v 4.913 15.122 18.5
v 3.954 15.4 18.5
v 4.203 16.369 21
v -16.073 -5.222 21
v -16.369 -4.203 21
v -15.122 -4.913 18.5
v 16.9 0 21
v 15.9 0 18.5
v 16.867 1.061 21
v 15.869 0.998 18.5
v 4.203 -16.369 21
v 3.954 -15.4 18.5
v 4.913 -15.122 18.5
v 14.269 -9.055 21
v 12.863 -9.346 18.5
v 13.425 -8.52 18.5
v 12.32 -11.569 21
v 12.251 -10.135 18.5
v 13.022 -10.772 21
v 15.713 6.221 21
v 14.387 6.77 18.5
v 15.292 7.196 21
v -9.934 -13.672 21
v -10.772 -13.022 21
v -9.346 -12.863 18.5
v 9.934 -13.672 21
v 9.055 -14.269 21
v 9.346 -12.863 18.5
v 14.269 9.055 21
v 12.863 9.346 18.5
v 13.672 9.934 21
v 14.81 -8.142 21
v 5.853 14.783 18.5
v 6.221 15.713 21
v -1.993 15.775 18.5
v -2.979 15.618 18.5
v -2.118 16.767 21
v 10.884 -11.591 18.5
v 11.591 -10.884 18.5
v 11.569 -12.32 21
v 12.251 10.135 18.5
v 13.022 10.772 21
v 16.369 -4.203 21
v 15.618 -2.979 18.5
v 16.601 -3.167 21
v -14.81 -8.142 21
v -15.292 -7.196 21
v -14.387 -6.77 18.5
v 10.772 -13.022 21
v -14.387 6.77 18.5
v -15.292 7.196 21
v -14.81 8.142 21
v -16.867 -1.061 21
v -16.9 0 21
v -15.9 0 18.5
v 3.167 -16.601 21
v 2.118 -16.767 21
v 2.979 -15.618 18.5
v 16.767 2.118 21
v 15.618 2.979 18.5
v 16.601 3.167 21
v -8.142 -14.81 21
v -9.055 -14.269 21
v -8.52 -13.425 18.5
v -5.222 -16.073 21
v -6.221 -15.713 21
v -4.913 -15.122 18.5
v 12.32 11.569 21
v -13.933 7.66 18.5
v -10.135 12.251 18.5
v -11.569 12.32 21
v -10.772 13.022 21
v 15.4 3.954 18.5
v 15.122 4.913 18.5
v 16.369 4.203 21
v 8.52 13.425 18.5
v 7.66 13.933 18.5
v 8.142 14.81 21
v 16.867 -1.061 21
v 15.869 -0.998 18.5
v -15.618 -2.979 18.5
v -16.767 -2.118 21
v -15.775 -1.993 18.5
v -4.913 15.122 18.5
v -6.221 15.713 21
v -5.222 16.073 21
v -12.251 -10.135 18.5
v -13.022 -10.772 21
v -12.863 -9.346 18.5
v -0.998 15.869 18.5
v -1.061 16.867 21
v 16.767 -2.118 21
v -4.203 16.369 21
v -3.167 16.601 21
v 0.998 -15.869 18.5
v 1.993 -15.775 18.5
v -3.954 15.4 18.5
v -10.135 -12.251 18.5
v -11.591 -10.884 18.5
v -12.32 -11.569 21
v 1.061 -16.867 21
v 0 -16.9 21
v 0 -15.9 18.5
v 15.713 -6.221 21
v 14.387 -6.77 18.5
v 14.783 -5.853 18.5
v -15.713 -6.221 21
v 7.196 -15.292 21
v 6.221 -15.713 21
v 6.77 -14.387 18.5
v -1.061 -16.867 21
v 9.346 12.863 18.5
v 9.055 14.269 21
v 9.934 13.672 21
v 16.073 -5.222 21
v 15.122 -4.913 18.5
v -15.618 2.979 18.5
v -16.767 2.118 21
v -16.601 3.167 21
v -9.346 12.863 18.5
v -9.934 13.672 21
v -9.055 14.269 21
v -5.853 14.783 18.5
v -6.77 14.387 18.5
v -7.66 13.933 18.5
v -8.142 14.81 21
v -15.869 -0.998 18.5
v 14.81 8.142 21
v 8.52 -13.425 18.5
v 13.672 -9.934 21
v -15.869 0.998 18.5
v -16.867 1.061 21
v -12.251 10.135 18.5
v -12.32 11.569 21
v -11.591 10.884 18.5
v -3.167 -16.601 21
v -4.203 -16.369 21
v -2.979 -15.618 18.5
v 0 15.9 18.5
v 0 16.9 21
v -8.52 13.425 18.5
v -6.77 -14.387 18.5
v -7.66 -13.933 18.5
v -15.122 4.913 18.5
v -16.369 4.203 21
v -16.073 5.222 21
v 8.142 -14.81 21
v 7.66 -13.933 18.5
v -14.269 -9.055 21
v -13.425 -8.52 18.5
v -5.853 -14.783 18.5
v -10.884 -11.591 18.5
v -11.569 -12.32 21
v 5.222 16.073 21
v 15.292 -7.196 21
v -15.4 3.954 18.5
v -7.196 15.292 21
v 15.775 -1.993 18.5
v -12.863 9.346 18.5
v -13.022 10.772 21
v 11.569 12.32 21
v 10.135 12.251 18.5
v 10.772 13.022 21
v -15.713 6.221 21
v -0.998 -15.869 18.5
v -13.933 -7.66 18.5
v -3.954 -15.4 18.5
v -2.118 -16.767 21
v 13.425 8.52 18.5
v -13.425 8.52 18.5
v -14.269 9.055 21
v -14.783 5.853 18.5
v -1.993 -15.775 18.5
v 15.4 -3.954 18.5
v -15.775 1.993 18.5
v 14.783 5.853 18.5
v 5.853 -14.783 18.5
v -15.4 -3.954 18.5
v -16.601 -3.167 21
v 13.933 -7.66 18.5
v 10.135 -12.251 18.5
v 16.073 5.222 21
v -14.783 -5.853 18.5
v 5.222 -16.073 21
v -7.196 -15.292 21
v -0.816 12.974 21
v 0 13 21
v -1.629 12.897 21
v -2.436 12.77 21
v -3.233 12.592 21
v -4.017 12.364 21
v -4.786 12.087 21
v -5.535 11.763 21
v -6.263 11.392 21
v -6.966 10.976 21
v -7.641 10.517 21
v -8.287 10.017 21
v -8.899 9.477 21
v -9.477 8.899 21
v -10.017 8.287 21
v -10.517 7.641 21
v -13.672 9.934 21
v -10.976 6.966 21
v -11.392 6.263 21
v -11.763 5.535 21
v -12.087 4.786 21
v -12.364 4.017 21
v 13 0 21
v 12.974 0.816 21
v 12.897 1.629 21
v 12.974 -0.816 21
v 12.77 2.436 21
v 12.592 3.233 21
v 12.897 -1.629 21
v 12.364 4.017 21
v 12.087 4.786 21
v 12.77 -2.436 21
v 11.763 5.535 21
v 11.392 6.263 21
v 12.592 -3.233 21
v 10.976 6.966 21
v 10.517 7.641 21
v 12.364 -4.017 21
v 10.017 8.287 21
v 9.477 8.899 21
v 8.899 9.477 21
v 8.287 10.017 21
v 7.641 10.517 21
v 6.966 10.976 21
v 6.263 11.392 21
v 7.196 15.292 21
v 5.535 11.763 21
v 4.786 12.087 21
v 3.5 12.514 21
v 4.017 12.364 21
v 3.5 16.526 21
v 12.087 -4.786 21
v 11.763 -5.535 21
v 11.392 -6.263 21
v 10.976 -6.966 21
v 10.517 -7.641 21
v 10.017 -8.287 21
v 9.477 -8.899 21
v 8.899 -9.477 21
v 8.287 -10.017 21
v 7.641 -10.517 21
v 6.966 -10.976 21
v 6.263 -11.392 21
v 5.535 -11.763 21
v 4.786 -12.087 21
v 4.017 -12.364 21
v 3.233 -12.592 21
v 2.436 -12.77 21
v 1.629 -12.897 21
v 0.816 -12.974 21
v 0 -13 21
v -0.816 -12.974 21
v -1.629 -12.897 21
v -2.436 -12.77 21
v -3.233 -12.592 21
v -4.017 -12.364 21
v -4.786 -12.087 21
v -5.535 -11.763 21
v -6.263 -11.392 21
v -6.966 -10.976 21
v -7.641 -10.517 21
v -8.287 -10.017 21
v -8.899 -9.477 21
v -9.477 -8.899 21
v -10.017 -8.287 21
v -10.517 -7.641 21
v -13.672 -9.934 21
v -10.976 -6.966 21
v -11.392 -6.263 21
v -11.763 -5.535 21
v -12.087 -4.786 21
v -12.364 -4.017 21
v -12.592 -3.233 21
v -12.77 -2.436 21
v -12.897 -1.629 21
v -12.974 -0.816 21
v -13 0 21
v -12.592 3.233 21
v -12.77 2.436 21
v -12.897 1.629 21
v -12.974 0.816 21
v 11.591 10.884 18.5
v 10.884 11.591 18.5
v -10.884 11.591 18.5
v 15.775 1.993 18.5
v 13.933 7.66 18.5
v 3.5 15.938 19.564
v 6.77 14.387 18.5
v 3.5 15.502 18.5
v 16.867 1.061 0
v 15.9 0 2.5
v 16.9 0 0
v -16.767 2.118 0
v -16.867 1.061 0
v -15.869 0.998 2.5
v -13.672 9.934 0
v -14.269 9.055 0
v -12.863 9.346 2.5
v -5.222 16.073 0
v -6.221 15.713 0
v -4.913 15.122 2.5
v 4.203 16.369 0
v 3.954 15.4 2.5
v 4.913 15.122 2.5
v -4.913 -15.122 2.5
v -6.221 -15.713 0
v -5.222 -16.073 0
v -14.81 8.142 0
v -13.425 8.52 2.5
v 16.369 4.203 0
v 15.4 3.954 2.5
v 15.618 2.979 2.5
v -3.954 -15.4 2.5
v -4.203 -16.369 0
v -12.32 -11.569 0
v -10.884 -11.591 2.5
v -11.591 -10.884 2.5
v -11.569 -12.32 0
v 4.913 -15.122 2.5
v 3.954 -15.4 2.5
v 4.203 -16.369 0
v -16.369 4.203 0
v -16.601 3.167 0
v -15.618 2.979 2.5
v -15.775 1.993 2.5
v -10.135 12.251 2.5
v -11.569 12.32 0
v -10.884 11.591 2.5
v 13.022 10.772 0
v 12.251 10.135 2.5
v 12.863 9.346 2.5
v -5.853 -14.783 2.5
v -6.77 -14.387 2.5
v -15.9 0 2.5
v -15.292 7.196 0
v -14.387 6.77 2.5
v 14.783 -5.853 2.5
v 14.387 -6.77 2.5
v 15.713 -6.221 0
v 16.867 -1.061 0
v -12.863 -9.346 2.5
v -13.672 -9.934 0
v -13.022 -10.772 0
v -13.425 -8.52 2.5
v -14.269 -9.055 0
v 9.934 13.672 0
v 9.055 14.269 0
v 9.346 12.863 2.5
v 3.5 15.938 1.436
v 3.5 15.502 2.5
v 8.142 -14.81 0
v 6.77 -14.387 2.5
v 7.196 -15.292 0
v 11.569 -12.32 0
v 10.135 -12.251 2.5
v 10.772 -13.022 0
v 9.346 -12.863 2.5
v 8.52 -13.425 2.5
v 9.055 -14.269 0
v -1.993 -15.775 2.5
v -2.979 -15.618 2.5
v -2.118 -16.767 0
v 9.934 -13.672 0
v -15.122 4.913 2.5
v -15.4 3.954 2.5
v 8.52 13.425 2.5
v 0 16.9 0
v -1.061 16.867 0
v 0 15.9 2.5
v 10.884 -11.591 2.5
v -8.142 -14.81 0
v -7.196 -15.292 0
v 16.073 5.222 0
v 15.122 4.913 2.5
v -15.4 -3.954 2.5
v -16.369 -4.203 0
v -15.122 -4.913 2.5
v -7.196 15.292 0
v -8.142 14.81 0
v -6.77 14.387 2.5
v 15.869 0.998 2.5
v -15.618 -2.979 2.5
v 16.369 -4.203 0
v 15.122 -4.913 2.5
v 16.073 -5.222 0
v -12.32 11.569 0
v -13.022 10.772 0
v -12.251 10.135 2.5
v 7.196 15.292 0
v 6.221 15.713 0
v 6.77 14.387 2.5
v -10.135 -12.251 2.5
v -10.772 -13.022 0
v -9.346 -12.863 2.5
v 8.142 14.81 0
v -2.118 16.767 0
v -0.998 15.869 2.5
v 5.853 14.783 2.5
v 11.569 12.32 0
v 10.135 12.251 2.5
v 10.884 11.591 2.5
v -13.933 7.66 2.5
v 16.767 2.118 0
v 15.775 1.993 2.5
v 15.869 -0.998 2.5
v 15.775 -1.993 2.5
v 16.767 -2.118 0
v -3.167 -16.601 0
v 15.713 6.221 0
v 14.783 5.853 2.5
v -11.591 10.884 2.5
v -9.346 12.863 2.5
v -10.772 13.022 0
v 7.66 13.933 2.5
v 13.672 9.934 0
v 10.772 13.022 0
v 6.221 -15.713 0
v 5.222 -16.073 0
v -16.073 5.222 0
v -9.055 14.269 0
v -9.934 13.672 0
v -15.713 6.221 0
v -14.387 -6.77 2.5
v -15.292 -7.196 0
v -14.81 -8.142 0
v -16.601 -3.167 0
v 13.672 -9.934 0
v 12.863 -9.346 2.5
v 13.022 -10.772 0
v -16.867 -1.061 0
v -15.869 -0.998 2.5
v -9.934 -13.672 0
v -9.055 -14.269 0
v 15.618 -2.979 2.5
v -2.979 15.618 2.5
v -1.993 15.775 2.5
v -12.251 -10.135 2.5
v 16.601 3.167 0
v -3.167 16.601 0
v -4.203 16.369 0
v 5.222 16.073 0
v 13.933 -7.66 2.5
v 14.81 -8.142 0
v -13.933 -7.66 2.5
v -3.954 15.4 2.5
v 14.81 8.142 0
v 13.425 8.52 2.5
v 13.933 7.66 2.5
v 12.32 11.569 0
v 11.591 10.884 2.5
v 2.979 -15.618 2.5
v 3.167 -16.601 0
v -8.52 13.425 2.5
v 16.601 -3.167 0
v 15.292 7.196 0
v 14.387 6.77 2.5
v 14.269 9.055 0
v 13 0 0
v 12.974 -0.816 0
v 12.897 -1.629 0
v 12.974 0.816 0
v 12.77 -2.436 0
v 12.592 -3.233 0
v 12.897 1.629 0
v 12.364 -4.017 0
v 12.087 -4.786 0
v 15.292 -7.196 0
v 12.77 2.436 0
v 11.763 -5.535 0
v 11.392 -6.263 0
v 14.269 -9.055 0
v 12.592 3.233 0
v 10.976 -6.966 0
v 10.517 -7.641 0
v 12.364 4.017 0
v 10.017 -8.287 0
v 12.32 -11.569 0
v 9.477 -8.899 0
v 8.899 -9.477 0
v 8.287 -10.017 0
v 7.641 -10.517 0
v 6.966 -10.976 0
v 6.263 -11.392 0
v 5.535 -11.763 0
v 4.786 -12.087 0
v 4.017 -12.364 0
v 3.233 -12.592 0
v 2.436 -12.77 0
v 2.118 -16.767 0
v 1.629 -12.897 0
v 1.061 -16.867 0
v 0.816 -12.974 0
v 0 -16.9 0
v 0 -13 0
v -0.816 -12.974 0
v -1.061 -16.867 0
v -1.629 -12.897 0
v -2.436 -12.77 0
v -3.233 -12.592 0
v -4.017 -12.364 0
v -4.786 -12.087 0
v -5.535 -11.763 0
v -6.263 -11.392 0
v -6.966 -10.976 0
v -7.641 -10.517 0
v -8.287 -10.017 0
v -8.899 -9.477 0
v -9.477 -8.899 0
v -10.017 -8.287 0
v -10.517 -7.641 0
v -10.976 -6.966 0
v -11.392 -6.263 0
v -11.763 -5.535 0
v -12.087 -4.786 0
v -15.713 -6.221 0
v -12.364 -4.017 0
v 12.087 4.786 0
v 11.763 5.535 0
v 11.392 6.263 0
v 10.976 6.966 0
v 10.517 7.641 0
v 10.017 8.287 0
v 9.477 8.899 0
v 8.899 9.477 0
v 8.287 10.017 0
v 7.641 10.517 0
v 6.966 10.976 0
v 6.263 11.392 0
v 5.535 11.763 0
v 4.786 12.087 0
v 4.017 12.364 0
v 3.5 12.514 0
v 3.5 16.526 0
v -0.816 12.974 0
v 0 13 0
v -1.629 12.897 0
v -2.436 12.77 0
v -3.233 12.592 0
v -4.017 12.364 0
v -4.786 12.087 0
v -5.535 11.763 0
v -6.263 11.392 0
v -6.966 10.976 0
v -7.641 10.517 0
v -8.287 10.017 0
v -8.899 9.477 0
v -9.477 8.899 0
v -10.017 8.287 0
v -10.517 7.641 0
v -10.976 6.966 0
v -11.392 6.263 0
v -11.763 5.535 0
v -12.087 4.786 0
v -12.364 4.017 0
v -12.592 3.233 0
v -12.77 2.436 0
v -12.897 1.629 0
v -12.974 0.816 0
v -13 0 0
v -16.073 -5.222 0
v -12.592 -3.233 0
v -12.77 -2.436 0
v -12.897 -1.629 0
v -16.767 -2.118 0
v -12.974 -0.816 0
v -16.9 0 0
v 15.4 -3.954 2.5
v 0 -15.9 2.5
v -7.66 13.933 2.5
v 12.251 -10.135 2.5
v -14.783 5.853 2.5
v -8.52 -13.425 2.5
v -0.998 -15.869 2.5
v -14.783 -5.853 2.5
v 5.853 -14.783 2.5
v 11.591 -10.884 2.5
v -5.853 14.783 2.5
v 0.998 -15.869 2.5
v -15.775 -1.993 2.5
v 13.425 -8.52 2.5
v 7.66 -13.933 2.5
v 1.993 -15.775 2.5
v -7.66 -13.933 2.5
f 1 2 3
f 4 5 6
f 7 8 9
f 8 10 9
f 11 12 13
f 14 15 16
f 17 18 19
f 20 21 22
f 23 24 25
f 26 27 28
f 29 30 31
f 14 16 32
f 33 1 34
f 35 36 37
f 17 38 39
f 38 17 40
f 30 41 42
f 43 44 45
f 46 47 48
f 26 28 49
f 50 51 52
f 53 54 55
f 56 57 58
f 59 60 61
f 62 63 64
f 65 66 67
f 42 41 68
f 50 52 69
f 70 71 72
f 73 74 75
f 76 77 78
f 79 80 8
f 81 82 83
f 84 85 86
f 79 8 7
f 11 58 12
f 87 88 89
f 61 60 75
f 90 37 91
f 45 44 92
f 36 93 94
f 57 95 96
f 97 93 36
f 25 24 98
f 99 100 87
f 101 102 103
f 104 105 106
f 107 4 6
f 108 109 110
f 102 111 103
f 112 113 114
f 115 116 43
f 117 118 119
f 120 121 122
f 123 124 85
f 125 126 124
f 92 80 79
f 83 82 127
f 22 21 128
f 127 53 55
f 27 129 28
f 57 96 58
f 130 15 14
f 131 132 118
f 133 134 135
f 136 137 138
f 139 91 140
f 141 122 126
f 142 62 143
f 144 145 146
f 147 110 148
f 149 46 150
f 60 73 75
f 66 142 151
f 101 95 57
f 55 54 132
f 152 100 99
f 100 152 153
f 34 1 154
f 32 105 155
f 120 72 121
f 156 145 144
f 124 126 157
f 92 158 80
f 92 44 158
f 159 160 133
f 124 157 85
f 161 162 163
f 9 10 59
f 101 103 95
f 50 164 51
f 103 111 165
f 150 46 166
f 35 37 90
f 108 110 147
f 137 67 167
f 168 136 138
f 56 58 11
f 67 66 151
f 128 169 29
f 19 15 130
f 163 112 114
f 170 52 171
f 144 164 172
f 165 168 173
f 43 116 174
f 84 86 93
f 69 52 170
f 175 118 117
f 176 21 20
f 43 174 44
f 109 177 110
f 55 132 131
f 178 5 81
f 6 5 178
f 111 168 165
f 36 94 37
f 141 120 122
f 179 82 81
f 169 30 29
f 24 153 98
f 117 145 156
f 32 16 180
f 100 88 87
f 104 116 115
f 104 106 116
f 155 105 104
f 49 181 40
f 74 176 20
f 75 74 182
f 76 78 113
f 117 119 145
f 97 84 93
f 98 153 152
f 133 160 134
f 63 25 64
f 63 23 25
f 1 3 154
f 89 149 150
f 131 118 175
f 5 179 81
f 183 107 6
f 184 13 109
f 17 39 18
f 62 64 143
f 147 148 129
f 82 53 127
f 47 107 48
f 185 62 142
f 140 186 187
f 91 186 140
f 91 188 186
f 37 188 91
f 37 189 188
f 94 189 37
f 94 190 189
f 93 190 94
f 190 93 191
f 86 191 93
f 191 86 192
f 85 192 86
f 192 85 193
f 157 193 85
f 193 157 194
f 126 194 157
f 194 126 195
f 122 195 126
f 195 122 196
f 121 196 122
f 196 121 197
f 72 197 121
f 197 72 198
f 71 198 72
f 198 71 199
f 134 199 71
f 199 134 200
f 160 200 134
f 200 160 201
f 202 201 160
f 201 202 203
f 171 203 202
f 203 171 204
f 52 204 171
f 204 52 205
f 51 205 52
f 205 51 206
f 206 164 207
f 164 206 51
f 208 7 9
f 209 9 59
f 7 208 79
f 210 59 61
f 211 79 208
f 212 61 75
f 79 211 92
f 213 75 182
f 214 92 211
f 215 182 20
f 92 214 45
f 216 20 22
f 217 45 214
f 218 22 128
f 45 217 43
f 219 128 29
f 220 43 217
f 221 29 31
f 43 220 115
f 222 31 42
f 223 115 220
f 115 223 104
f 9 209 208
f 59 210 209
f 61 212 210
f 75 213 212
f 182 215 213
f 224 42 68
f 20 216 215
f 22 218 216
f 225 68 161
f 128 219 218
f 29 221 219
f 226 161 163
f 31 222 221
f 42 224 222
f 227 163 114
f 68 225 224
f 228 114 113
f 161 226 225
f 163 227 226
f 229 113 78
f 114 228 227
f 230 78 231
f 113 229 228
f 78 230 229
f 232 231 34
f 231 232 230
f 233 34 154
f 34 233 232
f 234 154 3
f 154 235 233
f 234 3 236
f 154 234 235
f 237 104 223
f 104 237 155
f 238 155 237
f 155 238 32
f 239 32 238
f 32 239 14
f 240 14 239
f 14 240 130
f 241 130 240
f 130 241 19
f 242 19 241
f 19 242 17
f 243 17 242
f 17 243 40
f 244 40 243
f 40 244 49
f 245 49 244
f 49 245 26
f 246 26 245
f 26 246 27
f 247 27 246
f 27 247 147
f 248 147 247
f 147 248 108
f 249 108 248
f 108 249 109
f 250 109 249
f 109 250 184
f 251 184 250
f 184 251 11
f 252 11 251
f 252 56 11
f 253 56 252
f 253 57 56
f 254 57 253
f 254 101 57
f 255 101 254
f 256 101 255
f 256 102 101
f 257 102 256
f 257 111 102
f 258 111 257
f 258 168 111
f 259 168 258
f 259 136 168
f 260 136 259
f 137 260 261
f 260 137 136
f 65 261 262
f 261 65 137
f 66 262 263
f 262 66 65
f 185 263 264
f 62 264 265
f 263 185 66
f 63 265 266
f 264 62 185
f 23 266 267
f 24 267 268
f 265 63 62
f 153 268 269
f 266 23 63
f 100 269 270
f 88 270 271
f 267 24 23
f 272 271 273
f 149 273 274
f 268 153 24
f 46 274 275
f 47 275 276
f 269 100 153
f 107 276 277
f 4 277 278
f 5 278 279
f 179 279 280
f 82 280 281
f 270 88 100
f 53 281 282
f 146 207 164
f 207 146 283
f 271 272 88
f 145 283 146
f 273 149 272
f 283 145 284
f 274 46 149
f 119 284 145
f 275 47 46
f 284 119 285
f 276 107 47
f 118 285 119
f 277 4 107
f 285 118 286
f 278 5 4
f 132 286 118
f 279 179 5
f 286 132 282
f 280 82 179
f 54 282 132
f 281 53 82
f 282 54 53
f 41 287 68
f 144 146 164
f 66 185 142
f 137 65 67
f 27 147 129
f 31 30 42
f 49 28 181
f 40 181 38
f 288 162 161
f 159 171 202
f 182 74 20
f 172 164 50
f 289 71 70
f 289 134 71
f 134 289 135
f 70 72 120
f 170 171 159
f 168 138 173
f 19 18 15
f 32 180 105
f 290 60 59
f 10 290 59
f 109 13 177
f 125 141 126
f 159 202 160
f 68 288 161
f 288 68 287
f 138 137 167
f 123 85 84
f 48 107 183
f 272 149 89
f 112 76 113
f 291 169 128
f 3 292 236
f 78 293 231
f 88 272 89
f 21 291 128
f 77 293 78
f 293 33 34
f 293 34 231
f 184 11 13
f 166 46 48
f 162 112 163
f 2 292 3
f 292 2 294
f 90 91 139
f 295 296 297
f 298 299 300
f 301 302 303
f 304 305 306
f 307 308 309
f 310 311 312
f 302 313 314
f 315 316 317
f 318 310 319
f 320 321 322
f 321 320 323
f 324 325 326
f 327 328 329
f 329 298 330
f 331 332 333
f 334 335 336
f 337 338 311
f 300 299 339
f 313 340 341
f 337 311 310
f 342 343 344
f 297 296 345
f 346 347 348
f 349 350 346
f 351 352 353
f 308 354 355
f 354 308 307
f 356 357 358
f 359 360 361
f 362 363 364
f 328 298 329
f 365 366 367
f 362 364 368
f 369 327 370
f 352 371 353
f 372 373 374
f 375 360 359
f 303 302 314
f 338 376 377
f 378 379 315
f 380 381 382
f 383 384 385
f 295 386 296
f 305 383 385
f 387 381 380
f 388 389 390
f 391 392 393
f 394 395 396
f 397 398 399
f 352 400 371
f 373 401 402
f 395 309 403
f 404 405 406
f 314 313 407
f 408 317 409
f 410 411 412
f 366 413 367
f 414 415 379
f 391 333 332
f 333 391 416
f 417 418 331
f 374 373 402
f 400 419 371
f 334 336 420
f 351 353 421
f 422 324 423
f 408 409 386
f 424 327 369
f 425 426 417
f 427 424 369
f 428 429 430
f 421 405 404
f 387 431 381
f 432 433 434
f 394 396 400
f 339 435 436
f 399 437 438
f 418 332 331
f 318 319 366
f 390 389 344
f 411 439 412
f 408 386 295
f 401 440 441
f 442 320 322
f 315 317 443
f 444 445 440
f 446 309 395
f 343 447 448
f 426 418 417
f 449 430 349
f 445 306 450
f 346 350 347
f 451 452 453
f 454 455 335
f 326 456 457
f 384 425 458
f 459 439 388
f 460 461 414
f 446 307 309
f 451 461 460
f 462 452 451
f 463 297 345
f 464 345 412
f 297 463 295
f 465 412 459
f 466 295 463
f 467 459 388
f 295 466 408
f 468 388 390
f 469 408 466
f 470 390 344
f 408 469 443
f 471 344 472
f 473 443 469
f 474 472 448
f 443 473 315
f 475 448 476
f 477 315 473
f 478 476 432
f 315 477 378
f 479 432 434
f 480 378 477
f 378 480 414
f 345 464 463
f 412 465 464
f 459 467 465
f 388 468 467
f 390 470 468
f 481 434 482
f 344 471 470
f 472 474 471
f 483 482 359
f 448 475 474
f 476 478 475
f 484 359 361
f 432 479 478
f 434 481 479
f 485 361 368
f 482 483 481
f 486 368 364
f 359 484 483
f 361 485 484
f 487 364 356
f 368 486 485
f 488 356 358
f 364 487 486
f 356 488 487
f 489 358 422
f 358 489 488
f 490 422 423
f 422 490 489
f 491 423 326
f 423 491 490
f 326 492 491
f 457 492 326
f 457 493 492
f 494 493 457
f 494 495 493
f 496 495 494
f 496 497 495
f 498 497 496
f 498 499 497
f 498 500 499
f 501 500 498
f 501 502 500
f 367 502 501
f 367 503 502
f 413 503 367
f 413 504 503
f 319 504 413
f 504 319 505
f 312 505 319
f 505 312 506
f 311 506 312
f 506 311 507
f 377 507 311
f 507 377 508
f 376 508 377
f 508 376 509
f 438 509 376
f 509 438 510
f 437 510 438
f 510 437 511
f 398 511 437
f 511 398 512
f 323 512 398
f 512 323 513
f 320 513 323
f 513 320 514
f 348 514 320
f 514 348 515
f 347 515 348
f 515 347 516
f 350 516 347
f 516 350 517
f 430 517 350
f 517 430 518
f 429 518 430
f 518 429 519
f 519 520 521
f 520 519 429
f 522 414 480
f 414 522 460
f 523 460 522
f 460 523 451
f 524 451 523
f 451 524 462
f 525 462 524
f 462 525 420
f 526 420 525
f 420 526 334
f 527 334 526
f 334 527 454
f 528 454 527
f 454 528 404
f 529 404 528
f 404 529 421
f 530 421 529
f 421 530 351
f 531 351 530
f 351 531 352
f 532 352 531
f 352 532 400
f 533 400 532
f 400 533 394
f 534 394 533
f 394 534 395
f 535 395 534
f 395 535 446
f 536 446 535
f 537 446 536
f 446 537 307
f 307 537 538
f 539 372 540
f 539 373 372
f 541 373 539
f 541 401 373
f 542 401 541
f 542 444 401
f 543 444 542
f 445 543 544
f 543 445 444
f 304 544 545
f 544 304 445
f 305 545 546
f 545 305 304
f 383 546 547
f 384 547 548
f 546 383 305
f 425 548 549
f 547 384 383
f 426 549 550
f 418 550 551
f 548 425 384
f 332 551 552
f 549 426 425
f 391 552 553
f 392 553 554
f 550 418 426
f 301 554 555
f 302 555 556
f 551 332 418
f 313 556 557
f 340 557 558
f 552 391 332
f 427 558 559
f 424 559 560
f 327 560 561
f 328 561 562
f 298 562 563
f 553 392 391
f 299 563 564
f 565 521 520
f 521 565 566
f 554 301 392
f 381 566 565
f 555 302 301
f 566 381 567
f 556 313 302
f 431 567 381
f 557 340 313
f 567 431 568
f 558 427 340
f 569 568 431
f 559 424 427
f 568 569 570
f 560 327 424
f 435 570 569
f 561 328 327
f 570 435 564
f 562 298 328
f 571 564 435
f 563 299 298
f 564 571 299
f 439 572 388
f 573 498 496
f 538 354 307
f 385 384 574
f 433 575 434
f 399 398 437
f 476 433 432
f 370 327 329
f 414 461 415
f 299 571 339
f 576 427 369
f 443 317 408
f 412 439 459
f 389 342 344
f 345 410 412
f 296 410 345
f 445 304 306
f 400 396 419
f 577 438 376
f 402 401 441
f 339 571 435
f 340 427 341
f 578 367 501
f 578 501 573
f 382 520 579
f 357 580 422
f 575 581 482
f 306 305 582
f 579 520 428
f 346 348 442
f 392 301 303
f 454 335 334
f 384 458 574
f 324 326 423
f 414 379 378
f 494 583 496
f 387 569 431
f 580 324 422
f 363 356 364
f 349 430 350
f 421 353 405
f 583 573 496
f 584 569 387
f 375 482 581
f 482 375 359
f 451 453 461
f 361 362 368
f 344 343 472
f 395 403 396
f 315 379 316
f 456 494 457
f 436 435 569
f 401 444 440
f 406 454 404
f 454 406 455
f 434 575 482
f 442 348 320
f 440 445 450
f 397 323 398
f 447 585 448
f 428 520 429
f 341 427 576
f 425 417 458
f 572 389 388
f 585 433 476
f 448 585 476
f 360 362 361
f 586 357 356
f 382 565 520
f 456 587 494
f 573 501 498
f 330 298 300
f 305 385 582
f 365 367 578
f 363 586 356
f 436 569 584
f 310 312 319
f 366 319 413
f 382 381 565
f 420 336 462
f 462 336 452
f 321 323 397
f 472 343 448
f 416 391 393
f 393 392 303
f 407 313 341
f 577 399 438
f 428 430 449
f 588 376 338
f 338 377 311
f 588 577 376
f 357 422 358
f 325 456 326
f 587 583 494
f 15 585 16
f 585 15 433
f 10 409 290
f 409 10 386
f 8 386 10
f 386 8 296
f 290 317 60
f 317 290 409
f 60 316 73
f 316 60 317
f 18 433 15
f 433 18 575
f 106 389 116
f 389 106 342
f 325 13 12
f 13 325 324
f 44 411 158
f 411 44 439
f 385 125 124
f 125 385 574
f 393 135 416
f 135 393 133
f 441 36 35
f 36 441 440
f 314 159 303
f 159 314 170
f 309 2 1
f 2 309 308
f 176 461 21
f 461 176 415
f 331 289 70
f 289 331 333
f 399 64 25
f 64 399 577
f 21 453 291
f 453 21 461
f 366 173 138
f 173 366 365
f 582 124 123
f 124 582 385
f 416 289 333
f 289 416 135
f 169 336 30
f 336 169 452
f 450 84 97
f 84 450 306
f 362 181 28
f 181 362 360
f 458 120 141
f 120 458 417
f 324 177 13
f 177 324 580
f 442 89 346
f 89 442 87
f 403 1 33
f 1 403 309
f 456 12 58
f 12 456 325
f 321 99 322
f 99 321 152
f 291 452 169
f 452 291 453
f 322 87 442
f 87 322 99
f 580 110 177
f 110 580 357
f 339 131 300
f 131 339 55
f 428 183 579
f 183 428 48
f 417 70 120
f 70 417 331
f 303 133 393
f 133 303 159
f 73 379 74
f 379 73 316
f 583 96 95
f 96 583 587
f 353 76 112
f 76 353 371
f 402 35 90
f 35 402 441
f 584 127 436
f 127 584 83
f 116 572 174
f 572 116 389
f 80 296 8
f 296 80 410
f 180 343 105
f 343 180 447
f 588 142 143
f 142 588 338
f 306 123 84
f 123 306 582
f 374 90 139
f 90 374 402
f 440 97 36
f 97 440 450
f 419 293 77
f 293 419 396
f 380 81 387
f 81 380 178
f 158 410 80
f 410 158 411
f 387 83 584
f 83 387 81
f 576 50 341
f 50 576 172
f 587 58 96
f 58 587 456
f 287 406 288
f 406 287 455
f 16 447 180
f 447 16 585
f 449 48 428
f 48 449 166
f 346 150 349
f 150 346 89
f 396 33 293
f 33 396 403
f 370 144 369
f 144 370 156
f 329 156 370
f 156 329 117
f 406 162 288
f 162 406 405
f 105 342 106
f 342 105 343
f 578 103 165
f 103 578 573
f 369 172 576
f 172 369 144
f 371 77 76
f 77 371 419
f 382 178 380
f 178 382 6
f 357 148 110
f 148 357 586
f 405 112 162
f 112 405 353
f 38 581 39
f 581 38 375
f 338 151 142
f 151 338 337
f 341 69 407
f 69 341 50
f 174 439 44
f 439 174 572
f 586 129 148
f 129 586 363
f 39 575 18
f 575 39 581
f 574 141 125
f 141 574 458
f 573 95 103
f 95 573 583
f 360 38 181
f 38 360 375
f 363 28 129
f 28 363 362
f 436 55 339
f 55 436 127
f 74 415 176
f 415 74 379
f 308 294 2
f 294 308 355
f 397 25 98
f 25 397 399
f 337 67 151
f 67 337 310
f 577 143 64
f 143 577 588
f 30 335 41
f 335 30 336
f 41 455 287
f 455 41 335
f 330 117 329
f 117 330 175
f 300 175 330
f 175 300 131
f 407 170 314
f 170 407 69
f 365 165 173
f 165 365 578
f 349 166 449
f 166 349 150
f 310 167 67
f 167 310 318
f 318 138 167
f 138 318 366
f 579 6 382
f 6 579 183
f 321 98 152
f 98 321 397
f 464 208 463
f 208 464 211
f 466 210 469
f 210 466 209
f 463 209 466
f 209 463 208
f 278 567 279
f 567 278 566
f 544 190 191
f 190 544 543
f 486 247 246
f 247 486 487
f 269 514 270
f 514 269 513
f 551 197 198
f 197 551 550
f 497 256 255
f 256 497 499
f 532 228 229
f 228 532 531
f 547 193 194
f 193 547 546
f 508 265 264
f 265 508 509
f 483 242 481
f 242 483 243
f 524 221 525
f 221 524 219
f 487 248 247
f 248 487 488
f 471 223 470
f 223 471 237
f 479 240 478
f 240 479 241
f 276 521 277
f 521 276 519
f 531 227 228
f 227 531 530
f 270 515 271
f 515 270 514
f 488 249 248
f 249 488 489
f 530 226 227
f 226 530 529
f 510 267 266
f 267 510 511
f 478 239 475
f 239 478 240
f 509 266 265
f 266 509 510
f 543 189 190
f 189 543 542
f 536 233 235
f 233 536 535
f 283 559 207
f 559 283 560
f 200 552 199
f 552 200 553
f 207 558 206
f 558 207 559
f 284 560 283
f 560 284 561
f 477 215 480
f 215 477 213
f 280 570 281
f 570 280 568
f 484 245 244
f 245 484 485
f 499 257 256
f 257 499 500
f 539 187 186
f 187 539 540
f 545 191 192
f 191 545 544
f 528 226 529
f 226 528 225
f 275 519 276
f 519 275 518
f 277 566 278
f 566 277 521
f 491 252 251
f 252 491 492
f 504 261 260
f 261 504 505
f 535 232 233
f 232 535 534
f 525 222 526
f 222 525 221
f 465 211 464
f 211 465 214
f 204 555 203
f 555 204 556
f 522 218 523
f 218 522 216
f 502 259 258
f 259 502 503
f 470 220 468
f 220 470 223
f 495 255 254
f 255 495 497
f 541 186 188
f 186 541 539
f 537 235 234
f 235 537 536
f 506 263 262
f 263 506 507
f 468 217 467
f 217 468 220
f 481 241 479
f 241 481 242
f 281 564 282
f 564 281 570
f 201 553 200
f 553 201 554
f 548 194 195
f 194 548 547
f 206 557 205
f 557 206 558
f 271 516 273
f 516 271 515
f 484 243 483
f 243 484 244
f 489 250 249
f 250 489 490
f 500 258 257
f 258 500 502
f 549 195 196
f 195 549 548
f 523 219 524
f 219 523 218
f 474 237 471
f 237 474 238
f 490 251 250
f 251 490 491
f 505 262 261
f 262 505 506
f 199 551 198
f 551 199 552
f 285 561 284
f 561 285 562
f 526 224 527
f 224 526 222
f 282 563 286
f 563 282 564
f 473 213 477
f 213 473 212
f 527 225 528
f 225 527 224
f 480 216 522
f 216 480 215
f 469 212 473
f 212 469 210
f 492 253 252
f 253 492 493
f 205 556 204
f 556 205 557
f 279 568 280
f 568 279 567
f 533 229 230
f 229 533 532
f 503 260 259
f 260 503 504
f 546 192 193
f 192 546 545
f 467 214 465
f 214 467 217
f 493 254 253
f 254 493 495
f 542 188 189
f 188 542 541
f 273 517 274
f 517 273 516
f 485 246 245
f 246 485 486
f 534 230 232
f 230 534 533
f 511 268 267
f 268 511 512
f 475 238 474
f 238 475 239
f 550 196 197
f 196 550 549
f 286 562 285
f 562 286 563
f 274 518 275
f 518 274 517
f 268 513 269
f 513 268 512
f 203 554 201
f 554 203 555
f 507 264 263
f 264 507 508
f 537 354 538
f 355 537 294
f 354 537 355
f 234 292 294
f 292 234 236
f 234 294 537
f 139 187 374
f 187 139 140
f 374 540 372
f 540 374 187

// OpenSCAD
xdim = 80;
ydim = 140;
height= 150;

radius = 2.5;
/*
difference(){
    minkowski(){
    cube(size = [xdim, ydim,height]);
    sphere (radius, $fn=100);
    };
    translate([radius/12,radius/8,radius/8]) cube(size = [xdim, ydim,height+radius]);
}
*/
$fn=100;
difference()
{
    difference()
    {
        union(){
            union(){
                translate([0,0,18.5])
                cylinder(d1=31.8, d2=33.8, h=2.5);
                cylinder(d2=31.8, d1=33.8, h=2.5);
            }
            cylinder(d=31.8, h=21);
        }
        cylinder(d=26, h=22);
    }
    cube(size = [3.5, 40,22]);
   
}
